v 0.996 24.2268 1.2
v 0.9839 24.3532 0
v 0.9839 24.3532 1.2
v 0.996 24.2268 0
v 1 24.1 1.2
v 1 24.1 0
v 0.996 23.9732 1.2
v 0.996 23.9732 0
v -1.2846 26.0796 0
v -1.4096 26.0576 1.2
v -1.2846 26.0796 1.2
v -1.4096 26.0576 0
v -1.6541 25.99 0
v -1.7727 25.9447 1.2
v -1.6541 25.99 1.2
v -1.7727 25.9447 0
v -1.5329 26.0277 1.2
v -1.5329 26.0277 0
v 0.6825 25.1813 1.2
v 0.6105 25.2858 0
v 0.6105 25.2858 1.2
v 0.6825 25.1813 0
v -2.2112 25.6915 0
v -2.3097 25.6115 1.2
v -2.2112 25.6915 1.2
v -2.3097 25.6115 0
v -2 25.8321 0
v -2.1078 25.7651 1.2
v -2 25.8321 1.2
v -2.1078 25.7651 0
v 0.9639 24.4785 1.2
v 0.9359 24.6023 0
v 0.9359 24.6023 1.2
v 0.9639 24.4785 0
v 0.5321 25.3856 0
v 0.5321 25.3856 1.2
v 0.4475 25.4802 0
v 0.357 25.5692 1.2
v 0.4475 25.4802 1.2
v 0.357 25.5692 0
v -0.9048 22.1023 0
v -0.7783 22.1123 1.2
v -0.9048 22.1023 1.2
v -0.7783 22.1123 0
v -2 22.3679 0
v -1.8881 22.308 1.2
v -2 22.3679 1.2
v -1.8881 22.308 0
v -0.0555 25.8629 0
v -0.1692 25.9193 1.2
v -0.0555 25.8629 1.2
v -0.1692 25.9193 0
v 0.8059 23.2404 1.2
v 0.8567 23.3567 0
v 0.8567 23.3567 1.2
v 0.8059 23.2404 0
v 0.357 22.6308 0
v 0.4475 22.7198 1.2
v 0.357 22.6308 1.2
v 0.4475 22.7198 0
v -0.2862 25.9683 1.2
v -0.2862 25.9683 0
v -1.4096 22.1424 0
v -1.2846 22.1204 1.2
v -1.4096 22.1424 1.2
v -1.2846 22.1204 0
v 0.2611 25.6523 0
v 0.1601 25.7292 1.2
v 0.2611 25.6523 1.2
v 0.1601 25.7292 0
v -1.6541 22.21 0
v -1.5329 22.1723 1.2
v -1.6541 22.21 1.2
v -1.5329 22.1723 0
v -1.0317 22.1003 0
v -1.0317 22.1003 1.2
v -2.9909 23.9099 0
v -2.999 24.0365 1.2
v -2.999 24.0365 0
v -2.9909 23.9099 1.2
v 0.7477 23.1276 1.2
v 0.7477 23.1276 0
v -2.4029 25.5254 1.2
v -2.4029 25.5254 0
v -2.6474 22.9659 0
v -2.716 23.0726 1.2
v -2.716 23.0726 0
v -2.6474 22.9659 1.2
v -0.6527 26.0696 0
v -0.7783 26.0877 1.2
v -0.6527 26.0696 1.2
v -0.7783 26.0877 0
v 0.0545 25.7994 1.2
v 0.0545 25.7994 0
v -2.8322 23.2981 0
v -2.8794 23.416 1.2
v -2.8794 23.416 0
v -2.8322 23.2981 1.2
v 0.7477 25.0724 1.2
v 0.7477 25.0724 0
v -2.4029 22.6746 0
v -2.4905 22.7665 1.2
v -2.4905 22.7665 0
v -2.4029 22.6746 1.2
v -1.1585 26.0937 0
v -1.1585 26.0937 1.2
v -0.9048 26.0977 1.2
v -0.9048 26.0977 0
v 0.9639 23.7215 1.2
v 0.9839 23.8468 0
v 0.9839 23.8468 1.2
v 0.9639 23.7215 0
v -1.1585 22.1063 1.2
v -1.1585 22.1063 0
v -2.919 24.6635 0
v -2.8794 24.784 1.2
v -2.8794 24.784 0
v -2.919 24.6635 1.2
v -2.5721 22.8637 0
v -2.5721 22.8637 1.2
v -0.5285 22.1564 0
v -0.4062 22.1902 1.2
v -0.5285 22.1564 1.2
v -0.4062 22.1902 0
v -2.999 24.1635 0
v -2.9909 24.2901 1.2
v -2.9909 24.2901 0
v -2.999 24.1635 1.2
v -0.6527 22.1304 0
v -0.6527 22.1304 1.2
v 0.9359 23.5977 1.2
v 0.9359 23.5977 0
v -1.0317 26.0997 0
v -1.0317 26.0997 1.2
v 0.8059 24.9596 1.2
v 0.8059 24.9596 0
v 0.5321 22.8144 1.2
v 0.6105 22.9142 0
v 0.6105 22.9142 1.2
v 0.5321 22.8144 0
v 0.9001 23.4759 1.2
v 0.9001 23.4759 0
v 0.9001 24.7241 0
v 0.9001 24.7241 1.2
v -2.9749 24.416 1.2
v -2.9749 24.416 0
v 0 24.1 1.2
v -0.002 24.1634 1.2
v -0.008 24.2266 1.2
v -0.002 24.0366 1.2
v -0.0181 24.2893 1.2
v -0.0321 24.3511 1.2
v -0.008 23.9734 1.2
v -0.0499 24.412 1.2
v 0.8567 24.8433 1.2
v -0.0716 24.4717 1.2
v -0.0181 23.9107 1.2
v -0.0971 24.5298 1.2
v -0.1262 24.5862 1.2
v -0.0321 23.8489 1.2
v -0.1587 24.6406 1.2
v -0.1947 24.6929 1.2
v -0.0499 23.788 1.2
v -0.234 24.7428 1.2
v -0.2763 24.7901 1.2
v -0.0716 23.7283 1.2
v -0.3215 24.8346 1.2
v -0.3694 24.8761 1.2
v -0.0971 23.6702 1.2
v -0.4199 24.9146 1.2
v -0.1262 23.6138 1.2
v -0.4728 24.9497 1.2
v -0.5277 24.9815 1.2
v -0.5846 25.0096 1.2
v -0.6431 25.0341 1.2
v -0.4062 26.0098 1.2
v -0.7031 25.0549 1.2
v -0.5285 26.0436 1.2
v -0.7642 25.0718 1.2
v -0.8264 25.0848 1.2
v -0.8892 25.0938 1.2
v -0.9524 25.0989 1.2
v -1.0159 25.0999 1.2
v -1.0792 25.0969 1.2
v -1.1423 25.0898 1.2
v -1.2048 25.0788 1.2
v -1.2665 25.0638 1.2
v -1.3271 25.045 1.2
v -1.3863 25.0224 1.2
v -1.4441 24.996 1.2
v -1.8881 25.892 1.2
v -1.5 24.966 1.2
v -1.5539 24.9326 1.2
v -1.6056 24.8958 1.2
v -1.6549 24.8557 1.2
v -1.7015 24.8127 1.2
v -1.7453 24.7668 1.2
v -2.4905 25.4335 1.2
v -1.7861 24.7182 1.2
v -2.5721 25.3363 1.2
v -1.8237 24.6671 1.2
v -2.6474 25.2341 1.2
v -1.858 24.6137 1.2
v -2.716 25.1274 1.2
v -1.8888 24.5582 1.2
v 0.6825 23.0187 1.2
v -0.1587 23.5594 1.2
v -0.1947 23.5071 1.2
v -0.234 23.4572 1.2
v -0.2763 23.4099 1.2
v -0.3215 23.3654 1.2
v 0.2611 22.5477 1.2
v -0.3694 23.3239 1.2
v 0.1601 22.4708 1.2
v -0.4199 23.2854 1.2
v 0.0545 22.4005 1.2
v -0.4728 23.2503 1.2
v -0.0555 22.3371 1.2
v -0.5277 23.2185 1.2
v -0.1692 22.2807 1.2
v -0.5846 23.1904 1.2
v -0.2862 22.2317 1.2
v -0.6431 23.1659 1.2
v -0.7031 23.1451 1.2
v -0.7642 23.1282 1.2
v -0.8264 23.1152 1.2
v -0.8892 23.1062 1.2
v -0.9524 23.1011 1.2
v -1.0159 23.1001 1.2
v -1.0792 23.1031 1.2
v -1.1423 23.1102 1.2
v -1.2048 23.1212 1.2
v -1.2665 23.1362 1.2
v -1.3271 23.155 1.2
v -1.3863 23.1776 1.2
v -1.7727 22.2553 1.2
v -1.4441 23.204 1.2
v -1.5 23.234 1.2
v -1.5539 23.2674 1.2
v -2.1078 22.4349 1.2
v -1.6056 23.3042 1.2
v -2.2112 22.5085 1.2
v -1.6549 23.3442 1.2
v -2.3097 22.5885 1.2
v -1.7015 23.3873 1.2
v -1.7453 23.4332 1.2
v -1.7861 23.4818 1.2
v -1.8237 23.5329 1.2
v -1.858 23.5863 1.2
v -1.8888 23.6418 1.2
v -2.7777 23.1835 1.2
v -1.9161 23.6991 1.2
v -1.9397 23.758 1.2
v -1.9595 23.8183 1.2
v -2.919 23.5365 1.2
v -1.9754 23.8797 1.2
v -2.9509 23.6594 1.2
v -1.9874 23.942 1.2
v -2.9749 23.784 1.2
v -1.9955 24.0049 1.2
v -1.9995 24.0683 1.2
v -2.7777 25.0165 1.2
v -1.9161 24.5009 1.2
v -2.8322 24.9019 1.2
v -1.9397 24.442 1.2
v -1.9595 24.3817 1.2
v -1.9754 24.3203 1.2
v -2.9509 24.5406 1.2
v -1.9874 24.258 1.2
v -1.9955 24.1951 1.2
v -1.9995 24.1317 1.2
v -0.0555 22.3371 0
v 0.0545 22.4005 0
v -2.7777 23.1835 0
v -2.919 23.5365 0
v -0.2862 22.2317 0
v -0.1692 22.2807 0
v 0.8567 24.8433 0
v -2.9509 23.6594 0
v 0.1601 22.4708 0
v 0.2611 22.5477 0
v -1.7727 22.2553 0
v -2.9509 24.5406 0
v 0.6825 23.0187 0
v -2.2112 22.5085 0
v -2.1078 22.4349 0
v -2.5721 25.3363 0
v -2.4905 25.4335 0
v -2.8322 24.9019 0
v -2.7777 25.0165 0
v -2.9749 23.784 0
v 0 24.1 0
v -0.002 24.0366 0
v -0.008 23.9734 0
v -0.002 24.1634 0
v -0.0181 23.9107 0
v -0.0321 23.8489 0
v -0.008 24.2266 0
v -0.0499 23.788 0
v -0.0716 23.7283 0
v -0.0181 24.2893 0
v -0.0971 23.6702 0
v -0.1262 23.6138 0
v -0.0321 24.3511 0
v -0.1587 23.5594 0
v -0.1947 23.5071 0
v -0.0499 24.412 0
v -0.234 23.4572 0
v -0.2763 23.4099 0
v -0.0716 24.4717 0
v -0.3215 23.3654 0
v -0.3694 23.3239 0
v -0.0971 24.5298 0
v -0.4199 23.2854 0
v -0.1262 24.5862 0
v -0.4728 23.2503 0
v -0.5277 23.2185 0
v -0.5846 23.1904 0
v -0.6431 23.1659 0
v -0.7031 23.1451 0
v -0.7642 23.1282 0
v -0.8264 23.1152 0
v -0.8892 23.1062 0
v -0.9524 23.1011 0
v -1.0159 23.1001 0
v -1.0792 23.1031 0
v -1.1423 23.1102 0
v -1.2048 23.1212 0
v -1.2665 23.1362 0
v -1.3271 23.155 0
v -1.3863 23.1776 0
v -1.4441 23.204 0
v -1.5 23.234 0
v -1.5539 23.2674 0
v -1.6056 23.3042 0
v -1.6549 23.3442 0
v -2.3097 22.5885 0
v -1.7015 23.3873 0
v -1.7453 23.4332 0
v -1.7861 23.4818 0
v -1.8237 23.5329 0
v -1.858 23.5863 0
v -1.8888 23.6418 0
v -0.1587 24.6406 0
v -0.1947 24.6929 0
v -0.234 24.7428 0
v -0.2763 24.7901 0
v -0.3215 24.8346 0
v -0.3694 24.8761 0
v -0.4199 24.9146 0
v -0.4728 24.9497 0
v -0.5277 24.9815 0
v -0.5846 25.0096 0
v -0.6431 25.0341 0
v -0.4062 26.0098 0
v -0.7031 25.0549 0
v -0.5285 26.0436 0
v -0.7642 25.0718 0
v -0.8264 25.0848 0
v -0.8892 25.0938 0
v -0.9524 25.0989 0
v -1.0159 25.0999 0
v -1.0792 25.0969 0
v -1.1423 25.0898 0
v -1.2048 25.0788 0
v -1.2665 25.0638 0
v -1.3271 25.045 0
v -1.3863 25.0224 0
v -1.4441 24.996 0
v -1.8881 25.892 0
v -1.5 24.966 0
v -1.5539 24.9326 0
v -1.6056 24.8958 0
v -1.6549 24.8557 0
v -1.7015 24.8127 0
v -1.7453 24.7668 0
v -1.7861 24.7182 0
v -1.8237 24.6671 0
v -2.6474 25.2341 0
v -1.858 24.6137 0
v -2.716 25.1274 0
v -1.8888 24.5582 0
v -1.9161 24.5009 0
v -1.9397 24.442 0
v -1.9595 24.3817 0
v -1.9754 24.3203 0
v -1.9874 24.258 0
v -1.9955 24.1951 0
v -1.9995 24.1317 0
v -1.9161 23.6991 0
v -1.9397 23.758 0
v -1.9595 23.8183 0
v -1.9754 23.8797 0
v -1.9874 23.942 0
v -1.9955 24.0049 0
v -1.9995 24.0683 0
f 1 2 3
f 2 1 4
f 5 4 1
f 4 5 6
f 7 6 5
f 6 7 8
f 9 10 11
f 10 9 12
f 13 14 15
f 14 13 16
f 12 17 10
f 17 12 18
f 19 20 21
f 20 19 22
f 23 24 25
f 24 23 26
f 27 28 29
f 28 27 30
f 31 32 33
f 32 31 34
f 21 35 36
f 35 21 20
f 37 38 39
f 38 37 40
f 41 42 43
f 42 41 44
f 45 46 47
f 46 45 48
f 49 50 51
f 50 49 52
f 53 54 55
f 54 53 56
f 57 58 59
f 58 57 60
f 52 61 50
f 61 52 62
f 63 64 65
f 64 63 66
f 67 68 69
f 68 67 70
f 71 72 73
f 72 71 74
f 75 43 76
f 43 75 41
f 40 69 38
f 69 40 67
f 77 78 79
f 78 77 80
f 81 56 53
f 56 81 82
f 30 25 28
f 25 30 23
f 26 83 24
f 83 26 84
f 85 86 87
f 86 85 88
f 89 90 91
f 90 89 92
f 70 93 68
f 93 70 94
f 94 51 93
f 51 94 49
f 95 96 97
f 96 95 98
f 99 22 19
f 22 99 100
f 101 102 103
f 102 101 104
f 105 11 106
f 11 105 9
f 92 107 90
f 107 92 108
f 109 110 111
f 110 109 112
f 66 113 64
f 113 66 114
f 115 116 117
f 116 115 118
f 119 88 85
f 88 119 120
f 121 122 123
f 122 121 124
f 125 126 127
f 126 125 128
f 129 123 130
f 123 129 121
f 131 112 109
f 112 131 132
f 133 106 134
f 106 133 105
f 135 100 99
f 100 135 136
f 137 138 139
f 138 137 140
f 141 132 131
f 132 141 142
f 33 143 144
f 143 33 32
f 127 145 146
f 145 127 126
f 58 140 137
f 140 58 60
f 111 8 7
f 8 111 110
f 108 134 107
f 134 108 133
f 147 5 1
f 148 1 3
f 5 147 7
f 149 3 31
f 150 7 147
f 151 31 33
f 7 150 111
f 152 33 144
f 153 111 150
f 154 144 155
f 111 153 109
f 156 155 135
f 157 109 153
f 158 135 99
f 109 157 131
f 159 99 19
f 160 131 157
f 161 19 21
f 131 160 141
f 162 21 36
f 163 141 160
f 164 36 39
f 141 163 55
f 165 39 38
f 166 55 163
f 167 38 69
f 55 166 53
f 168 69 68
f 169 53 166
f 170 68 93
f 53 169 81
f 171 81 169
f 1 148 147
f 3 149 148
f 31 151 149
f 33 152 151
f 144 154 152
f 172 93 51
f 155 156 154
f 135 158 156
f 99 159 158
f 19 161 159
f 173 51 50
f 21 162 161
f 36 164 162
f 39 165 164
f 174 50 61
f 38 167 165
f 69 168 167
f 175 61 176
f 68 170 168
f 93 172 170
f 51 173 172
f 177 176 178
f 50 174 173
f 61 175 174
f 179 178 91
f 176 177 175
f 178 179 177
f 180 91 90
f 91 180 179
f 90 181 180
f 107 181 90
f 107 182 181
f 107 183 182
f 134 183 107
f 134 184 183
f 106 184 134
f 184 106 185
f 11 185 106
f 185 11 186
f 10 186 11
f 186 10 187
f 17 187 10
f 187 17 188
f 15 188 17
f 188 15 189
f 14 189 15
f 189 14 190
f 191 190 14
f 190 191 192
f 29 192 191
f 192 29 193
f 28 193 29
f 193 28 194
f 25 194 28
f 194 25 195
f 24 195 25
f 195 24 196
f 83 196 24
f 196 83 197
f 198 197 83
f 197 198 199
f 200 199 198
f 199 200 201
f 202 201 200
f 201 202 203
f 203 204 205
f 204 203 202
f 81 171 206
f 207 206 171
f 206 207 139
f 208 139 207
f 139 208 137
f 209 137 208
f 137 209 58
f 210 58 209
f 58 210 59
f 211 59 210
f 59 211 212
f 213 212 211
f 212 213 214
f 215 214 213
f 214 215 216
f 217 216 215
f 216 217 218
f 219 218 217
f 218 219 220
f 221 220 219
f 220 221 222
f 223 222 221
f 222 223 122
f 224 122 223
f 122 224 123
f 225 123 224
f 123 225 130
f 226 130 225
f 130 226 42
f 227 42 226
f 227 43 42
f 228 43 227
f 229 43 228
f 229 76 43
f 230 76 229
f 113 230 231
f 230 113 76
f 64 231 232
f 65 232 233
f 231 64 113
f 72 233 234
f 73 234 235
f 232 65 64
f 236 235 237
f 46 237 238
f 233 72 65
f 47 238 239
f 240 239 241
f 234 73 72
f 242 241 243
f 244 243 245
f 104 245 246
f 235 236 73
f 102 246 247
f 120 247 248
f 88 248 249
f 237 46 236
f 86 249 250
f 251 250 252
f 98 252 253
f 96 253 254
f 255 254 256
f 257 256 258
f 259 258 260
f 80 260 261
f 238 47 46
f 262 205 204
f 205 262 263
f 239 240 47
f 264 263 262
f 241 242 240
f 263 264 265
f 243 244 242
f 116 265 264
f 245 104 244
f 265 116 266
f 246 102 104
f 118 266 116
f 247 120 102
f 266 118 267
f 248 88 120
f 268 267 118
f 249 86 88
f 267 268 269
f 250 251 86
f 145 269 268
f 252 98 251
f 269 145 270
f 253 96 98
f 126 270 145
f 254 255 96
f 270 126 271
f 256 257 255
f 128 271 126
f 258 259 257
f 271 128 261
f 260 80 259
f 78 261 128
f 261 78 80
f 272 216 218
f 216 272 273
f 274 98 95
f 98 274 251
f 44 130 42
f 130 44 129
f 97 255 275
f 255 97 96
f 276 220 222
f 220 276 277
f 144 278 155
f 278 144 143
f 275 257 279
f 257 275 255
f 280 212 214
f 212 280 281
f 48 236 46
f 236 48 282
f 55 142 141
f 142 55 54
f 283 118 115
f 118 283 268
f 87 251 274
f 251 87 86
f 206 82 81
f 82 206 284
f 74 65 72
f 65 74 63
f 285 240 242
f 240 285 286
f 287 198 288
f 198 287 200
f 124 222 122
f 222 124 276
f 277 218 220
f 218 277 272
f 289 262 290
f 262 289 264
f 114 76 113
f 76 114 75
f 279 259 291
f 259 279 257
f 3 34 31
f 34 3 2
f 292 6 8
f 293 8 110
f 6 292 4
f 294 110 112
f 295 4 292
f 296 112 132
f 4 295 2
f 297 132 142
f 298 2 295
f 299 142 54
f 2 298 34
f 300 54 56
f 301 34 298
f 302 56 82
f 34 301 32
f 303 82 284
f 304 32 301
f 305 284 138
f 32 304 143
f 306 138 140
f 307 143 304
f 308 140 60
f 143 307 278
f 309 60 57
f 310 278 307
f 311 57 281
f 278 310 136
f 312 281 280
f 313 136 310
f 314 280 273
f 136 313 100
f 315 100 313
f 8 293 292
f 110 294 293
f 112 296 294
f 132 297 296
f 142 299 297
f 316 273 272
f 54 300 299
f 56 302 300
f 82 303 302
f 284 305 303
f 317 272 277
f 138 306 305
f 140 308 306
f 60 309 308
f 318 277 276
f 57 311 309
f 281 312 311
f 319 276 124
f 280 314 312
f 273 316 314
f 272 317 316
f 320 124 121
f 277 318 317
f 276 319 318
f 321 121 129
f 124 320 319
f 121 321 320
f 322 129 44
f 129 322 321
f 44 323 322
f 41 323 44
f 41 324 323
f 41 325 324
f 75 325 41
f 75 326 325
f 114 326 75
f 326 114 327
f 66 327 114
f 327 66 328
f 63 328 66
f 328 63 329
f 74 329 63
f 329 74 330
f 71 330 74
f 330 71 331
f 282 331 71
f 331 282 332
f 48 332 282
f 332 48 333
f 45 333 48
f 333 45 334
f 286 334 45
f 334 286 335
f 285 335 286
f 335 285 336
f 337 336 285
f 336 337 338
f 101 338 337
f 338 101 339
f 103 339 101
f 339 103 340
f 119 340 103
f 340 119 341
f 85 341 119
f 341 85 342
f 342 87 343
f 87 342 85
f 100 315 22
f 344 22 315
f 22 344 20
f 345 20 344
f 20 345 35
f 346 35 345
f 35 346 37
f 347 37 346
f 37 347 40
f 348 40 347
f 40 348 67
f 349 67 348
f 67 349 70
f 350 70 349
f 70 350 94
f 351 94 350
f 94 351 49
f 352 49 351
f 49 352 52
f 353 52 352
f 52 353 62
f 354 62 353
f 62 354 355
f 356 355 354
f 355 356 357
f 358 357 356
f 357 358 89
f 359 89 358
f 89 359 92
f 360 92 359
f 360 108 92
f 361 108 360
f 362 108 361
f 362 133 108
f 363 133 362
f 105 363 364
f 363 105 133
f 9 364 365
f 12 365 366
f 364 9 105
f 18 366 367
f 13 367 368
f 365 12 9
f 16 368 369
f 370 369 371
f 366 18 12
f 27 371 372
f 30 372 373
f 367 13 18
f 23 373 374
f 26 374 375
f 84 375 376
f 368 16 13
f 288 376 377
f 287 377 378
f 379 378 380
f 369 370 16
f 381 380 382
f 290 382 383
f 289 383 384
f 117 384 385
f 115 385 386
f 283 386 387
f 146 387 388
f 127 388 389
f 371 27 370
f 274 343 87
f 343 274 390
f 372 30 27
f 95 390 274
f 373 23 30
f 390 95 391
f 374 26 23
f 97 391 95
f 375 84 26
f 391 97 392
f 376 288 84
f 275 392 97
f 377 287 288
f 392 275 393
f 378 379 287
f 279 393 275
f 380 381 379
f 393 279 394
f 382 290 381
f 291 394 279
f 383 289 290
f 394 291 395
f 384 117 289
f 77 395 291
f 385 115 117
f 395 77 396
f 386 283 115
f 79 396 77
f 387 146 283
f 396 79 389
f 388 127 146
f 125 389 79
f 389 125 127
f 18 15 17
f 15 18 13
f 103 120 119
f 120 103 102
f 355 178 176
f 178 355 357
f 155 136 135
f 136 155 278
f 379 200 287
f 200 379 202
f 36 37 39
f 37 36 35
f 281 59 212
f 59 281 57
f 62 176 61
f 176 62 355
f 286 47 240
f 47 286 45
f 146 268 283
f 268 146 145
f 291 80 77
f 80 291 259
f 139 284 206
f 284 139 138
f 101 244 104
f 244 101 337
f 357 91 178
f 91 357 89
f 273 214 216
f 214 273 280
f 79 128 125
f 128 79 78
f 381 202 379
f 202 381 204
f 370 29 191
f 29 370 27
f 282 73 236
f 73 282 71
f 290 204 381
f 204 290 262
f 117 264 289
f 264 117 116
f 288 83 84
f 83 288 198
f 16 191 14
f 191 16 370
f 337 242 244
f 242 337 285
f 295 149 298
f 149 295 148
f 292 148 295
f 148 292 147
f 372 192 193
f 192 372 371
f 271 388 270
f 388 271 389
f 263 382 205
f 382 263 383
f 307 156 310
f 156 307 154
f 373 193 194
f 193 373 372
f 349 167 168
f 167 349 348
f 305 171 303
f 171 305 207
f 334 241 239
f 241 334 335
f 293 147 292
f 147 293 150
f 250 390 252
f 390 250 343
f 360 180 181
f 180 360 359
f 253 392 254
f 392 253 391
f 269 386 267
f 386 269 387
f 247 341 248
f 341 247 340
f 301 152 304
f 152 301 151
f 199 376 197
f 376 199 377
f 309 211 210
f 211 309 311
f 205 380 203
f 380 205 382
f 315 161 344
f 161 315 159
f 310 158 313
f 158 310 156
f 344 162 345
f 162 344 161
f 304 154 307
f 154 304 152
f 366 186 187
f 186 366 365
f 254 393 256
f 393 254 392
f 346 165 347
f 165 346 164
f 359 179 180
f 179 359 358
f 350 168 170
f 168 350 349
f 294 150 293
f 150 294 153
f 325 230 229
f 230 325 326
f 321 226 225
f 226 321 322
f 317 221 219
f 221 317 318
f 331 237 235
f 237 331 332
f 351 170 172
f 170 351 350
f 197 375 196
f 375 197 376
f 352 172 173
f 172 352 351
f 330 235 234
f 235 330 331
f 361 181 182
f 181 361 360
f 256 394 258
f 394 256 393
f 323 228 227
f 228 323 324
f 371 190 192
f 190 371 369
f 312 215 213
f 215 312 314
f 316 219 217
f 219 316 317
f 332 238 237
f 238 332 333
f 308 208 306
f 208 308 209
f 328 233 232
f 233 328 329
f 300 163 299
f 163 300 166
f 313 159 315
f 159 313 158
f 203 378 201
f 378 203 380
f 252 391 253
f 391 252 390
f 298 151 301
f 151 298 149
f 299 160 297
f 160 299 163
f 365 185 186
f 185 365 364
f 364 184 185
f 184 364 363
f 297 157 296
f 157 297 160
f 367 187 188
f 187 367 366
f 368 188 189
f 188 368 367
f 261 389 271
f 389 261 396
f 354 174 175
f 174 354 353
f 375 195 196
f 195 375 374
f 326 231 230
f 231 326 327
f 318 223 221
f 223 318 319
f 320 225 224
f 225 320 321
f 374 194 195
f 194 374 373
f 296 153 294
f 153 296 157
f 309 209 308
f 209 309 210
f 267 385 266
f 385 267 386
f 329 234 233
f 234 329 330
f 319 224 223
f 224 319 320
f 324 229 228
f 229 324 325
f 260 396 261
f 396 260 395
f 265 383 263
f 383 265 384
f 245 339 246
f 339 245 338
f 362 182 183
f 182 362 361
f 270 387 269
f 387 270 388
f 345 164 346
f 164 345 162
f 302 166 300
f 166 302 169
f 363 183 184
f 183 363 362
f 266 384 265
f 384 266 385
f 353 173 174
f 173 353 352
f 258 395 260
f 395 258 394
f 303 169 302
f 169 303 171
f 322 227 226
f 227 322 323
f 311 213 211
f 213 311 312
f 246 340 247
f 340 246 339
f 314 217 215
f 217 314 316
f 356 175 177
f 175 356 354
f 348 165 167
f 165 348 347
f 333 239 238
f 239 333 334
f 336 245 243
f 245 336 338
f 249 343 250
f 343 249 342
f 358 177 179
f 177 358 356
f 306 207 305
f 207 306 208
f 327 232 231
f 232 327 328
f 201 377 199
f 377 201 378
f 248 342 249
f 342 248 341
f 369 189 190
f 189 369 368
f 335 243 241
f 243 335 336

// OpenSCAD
//=================================================================================
// FlyingPig2.scad
//
//
// Dr Tom Flint, 3 April 2025
//=================================================================================


thick=1.2;
r1=65;
F2=99;

//-----------------------------------------------------------------------------------
module black(){
  
  render()
  intersection(){
    translate([0,0,80])
    scale([1,1,1])
    surface(file="./FlyingPigBlack2.png", center = true, invert=true);
  
    translate([0,0,thick/2])
    cube([800,800,thick],center=true);
  }
  
  // hanger loop
    translate([-10,241,0])
    difference(){
      cylinder(r=20,h=thick,$fn=F2);
      cylinder(r=10,h=thick,$fn=F2);
    }
}  

//-----------------------------------------------------------------------------------
module pink(){
  
  render()
  intersection(){
    translate([0,0,50])
    scale([1,1,1])
    surface(file="./FlyingPigPink2.png", center = true, invert=true);
    
    translate([0,0,thick/2])
    cube([800,800,thick],center=true);
  }
}  

//-----------------------------------------------------------------------------------
module pinkA(){
  
  render()
  intersection(){
    translate([0,0,50])
    scale([1,1,1])
    surface(file="./FlyingPigPink2.png", center = true, invert=true);
    
    translate([0,0,0.6/2])
    cube([800,800,0.6],center=true);
  }
}  

//-----------------------------------------------------------------------------------
module pinkB(){
  
  render()
  intersection(){
    translate([0,0,50])
    scale([1,1,1])
    surface(file="./FlyingPigPink2.png", center = true, invert=true);
    
    translate([0,0,0.6/2+0.6])
    cube([800,800,0.6],center=true);
  }
}  

//-----------------------------------------------------------------------------------
module wings(){
  
  render()
  intersection(){
    translate([0,0,50])
    scale([1,1,1])
    surface(file="./FlyingPigWings2.png", center = true, invert=true);
    
    translate([0,0,thick/2])
    cube([800,800,thick],center=true);
  }
}  

//-----------------------------------------------------------------------------------
module wingsA(){
  
  render()
  intersection(){
    translate([0,0,50])
    scale([1,1,1])
    surface(file="./FlyingPigWings2.png", center = true, invert=true);
    
    translate([0,0,thick/4])
    cube([800,800,thick/2],center=true);
  }
}  

//-----------------------------------------------------------------------------------
module wingsB(){
  
  render()
  intersection(){
    translate([0,0,50])
    scale([1,1,1])
    surface(file="./FlyingPigWings2.png", center = true, invert=true);
    
    translate([0,0,thick/2+thick/4])
    cube([800,800,thick/2],center=true);
  }
}  

//-----------------------------------------------------------------------------------
module hooves(){
  
  render()
  intersection(){
    translate([0,0,50])
    scale([1,1,1])
    surface(file="./FlyingPigHooves2.png", center = true, invert=true);
    
    translate([0,0,thick/2])
    cube([800,800,thick],center=true);
  }
}  

//=================================================================================

scale([0.1,0.1,1]){

black();
//~ pink();
//~ pinkA();
//~ pinkB();
//~ wings();
//~ wingsA();
//~ wingsB();
hooves();

}

//=================================================================================
